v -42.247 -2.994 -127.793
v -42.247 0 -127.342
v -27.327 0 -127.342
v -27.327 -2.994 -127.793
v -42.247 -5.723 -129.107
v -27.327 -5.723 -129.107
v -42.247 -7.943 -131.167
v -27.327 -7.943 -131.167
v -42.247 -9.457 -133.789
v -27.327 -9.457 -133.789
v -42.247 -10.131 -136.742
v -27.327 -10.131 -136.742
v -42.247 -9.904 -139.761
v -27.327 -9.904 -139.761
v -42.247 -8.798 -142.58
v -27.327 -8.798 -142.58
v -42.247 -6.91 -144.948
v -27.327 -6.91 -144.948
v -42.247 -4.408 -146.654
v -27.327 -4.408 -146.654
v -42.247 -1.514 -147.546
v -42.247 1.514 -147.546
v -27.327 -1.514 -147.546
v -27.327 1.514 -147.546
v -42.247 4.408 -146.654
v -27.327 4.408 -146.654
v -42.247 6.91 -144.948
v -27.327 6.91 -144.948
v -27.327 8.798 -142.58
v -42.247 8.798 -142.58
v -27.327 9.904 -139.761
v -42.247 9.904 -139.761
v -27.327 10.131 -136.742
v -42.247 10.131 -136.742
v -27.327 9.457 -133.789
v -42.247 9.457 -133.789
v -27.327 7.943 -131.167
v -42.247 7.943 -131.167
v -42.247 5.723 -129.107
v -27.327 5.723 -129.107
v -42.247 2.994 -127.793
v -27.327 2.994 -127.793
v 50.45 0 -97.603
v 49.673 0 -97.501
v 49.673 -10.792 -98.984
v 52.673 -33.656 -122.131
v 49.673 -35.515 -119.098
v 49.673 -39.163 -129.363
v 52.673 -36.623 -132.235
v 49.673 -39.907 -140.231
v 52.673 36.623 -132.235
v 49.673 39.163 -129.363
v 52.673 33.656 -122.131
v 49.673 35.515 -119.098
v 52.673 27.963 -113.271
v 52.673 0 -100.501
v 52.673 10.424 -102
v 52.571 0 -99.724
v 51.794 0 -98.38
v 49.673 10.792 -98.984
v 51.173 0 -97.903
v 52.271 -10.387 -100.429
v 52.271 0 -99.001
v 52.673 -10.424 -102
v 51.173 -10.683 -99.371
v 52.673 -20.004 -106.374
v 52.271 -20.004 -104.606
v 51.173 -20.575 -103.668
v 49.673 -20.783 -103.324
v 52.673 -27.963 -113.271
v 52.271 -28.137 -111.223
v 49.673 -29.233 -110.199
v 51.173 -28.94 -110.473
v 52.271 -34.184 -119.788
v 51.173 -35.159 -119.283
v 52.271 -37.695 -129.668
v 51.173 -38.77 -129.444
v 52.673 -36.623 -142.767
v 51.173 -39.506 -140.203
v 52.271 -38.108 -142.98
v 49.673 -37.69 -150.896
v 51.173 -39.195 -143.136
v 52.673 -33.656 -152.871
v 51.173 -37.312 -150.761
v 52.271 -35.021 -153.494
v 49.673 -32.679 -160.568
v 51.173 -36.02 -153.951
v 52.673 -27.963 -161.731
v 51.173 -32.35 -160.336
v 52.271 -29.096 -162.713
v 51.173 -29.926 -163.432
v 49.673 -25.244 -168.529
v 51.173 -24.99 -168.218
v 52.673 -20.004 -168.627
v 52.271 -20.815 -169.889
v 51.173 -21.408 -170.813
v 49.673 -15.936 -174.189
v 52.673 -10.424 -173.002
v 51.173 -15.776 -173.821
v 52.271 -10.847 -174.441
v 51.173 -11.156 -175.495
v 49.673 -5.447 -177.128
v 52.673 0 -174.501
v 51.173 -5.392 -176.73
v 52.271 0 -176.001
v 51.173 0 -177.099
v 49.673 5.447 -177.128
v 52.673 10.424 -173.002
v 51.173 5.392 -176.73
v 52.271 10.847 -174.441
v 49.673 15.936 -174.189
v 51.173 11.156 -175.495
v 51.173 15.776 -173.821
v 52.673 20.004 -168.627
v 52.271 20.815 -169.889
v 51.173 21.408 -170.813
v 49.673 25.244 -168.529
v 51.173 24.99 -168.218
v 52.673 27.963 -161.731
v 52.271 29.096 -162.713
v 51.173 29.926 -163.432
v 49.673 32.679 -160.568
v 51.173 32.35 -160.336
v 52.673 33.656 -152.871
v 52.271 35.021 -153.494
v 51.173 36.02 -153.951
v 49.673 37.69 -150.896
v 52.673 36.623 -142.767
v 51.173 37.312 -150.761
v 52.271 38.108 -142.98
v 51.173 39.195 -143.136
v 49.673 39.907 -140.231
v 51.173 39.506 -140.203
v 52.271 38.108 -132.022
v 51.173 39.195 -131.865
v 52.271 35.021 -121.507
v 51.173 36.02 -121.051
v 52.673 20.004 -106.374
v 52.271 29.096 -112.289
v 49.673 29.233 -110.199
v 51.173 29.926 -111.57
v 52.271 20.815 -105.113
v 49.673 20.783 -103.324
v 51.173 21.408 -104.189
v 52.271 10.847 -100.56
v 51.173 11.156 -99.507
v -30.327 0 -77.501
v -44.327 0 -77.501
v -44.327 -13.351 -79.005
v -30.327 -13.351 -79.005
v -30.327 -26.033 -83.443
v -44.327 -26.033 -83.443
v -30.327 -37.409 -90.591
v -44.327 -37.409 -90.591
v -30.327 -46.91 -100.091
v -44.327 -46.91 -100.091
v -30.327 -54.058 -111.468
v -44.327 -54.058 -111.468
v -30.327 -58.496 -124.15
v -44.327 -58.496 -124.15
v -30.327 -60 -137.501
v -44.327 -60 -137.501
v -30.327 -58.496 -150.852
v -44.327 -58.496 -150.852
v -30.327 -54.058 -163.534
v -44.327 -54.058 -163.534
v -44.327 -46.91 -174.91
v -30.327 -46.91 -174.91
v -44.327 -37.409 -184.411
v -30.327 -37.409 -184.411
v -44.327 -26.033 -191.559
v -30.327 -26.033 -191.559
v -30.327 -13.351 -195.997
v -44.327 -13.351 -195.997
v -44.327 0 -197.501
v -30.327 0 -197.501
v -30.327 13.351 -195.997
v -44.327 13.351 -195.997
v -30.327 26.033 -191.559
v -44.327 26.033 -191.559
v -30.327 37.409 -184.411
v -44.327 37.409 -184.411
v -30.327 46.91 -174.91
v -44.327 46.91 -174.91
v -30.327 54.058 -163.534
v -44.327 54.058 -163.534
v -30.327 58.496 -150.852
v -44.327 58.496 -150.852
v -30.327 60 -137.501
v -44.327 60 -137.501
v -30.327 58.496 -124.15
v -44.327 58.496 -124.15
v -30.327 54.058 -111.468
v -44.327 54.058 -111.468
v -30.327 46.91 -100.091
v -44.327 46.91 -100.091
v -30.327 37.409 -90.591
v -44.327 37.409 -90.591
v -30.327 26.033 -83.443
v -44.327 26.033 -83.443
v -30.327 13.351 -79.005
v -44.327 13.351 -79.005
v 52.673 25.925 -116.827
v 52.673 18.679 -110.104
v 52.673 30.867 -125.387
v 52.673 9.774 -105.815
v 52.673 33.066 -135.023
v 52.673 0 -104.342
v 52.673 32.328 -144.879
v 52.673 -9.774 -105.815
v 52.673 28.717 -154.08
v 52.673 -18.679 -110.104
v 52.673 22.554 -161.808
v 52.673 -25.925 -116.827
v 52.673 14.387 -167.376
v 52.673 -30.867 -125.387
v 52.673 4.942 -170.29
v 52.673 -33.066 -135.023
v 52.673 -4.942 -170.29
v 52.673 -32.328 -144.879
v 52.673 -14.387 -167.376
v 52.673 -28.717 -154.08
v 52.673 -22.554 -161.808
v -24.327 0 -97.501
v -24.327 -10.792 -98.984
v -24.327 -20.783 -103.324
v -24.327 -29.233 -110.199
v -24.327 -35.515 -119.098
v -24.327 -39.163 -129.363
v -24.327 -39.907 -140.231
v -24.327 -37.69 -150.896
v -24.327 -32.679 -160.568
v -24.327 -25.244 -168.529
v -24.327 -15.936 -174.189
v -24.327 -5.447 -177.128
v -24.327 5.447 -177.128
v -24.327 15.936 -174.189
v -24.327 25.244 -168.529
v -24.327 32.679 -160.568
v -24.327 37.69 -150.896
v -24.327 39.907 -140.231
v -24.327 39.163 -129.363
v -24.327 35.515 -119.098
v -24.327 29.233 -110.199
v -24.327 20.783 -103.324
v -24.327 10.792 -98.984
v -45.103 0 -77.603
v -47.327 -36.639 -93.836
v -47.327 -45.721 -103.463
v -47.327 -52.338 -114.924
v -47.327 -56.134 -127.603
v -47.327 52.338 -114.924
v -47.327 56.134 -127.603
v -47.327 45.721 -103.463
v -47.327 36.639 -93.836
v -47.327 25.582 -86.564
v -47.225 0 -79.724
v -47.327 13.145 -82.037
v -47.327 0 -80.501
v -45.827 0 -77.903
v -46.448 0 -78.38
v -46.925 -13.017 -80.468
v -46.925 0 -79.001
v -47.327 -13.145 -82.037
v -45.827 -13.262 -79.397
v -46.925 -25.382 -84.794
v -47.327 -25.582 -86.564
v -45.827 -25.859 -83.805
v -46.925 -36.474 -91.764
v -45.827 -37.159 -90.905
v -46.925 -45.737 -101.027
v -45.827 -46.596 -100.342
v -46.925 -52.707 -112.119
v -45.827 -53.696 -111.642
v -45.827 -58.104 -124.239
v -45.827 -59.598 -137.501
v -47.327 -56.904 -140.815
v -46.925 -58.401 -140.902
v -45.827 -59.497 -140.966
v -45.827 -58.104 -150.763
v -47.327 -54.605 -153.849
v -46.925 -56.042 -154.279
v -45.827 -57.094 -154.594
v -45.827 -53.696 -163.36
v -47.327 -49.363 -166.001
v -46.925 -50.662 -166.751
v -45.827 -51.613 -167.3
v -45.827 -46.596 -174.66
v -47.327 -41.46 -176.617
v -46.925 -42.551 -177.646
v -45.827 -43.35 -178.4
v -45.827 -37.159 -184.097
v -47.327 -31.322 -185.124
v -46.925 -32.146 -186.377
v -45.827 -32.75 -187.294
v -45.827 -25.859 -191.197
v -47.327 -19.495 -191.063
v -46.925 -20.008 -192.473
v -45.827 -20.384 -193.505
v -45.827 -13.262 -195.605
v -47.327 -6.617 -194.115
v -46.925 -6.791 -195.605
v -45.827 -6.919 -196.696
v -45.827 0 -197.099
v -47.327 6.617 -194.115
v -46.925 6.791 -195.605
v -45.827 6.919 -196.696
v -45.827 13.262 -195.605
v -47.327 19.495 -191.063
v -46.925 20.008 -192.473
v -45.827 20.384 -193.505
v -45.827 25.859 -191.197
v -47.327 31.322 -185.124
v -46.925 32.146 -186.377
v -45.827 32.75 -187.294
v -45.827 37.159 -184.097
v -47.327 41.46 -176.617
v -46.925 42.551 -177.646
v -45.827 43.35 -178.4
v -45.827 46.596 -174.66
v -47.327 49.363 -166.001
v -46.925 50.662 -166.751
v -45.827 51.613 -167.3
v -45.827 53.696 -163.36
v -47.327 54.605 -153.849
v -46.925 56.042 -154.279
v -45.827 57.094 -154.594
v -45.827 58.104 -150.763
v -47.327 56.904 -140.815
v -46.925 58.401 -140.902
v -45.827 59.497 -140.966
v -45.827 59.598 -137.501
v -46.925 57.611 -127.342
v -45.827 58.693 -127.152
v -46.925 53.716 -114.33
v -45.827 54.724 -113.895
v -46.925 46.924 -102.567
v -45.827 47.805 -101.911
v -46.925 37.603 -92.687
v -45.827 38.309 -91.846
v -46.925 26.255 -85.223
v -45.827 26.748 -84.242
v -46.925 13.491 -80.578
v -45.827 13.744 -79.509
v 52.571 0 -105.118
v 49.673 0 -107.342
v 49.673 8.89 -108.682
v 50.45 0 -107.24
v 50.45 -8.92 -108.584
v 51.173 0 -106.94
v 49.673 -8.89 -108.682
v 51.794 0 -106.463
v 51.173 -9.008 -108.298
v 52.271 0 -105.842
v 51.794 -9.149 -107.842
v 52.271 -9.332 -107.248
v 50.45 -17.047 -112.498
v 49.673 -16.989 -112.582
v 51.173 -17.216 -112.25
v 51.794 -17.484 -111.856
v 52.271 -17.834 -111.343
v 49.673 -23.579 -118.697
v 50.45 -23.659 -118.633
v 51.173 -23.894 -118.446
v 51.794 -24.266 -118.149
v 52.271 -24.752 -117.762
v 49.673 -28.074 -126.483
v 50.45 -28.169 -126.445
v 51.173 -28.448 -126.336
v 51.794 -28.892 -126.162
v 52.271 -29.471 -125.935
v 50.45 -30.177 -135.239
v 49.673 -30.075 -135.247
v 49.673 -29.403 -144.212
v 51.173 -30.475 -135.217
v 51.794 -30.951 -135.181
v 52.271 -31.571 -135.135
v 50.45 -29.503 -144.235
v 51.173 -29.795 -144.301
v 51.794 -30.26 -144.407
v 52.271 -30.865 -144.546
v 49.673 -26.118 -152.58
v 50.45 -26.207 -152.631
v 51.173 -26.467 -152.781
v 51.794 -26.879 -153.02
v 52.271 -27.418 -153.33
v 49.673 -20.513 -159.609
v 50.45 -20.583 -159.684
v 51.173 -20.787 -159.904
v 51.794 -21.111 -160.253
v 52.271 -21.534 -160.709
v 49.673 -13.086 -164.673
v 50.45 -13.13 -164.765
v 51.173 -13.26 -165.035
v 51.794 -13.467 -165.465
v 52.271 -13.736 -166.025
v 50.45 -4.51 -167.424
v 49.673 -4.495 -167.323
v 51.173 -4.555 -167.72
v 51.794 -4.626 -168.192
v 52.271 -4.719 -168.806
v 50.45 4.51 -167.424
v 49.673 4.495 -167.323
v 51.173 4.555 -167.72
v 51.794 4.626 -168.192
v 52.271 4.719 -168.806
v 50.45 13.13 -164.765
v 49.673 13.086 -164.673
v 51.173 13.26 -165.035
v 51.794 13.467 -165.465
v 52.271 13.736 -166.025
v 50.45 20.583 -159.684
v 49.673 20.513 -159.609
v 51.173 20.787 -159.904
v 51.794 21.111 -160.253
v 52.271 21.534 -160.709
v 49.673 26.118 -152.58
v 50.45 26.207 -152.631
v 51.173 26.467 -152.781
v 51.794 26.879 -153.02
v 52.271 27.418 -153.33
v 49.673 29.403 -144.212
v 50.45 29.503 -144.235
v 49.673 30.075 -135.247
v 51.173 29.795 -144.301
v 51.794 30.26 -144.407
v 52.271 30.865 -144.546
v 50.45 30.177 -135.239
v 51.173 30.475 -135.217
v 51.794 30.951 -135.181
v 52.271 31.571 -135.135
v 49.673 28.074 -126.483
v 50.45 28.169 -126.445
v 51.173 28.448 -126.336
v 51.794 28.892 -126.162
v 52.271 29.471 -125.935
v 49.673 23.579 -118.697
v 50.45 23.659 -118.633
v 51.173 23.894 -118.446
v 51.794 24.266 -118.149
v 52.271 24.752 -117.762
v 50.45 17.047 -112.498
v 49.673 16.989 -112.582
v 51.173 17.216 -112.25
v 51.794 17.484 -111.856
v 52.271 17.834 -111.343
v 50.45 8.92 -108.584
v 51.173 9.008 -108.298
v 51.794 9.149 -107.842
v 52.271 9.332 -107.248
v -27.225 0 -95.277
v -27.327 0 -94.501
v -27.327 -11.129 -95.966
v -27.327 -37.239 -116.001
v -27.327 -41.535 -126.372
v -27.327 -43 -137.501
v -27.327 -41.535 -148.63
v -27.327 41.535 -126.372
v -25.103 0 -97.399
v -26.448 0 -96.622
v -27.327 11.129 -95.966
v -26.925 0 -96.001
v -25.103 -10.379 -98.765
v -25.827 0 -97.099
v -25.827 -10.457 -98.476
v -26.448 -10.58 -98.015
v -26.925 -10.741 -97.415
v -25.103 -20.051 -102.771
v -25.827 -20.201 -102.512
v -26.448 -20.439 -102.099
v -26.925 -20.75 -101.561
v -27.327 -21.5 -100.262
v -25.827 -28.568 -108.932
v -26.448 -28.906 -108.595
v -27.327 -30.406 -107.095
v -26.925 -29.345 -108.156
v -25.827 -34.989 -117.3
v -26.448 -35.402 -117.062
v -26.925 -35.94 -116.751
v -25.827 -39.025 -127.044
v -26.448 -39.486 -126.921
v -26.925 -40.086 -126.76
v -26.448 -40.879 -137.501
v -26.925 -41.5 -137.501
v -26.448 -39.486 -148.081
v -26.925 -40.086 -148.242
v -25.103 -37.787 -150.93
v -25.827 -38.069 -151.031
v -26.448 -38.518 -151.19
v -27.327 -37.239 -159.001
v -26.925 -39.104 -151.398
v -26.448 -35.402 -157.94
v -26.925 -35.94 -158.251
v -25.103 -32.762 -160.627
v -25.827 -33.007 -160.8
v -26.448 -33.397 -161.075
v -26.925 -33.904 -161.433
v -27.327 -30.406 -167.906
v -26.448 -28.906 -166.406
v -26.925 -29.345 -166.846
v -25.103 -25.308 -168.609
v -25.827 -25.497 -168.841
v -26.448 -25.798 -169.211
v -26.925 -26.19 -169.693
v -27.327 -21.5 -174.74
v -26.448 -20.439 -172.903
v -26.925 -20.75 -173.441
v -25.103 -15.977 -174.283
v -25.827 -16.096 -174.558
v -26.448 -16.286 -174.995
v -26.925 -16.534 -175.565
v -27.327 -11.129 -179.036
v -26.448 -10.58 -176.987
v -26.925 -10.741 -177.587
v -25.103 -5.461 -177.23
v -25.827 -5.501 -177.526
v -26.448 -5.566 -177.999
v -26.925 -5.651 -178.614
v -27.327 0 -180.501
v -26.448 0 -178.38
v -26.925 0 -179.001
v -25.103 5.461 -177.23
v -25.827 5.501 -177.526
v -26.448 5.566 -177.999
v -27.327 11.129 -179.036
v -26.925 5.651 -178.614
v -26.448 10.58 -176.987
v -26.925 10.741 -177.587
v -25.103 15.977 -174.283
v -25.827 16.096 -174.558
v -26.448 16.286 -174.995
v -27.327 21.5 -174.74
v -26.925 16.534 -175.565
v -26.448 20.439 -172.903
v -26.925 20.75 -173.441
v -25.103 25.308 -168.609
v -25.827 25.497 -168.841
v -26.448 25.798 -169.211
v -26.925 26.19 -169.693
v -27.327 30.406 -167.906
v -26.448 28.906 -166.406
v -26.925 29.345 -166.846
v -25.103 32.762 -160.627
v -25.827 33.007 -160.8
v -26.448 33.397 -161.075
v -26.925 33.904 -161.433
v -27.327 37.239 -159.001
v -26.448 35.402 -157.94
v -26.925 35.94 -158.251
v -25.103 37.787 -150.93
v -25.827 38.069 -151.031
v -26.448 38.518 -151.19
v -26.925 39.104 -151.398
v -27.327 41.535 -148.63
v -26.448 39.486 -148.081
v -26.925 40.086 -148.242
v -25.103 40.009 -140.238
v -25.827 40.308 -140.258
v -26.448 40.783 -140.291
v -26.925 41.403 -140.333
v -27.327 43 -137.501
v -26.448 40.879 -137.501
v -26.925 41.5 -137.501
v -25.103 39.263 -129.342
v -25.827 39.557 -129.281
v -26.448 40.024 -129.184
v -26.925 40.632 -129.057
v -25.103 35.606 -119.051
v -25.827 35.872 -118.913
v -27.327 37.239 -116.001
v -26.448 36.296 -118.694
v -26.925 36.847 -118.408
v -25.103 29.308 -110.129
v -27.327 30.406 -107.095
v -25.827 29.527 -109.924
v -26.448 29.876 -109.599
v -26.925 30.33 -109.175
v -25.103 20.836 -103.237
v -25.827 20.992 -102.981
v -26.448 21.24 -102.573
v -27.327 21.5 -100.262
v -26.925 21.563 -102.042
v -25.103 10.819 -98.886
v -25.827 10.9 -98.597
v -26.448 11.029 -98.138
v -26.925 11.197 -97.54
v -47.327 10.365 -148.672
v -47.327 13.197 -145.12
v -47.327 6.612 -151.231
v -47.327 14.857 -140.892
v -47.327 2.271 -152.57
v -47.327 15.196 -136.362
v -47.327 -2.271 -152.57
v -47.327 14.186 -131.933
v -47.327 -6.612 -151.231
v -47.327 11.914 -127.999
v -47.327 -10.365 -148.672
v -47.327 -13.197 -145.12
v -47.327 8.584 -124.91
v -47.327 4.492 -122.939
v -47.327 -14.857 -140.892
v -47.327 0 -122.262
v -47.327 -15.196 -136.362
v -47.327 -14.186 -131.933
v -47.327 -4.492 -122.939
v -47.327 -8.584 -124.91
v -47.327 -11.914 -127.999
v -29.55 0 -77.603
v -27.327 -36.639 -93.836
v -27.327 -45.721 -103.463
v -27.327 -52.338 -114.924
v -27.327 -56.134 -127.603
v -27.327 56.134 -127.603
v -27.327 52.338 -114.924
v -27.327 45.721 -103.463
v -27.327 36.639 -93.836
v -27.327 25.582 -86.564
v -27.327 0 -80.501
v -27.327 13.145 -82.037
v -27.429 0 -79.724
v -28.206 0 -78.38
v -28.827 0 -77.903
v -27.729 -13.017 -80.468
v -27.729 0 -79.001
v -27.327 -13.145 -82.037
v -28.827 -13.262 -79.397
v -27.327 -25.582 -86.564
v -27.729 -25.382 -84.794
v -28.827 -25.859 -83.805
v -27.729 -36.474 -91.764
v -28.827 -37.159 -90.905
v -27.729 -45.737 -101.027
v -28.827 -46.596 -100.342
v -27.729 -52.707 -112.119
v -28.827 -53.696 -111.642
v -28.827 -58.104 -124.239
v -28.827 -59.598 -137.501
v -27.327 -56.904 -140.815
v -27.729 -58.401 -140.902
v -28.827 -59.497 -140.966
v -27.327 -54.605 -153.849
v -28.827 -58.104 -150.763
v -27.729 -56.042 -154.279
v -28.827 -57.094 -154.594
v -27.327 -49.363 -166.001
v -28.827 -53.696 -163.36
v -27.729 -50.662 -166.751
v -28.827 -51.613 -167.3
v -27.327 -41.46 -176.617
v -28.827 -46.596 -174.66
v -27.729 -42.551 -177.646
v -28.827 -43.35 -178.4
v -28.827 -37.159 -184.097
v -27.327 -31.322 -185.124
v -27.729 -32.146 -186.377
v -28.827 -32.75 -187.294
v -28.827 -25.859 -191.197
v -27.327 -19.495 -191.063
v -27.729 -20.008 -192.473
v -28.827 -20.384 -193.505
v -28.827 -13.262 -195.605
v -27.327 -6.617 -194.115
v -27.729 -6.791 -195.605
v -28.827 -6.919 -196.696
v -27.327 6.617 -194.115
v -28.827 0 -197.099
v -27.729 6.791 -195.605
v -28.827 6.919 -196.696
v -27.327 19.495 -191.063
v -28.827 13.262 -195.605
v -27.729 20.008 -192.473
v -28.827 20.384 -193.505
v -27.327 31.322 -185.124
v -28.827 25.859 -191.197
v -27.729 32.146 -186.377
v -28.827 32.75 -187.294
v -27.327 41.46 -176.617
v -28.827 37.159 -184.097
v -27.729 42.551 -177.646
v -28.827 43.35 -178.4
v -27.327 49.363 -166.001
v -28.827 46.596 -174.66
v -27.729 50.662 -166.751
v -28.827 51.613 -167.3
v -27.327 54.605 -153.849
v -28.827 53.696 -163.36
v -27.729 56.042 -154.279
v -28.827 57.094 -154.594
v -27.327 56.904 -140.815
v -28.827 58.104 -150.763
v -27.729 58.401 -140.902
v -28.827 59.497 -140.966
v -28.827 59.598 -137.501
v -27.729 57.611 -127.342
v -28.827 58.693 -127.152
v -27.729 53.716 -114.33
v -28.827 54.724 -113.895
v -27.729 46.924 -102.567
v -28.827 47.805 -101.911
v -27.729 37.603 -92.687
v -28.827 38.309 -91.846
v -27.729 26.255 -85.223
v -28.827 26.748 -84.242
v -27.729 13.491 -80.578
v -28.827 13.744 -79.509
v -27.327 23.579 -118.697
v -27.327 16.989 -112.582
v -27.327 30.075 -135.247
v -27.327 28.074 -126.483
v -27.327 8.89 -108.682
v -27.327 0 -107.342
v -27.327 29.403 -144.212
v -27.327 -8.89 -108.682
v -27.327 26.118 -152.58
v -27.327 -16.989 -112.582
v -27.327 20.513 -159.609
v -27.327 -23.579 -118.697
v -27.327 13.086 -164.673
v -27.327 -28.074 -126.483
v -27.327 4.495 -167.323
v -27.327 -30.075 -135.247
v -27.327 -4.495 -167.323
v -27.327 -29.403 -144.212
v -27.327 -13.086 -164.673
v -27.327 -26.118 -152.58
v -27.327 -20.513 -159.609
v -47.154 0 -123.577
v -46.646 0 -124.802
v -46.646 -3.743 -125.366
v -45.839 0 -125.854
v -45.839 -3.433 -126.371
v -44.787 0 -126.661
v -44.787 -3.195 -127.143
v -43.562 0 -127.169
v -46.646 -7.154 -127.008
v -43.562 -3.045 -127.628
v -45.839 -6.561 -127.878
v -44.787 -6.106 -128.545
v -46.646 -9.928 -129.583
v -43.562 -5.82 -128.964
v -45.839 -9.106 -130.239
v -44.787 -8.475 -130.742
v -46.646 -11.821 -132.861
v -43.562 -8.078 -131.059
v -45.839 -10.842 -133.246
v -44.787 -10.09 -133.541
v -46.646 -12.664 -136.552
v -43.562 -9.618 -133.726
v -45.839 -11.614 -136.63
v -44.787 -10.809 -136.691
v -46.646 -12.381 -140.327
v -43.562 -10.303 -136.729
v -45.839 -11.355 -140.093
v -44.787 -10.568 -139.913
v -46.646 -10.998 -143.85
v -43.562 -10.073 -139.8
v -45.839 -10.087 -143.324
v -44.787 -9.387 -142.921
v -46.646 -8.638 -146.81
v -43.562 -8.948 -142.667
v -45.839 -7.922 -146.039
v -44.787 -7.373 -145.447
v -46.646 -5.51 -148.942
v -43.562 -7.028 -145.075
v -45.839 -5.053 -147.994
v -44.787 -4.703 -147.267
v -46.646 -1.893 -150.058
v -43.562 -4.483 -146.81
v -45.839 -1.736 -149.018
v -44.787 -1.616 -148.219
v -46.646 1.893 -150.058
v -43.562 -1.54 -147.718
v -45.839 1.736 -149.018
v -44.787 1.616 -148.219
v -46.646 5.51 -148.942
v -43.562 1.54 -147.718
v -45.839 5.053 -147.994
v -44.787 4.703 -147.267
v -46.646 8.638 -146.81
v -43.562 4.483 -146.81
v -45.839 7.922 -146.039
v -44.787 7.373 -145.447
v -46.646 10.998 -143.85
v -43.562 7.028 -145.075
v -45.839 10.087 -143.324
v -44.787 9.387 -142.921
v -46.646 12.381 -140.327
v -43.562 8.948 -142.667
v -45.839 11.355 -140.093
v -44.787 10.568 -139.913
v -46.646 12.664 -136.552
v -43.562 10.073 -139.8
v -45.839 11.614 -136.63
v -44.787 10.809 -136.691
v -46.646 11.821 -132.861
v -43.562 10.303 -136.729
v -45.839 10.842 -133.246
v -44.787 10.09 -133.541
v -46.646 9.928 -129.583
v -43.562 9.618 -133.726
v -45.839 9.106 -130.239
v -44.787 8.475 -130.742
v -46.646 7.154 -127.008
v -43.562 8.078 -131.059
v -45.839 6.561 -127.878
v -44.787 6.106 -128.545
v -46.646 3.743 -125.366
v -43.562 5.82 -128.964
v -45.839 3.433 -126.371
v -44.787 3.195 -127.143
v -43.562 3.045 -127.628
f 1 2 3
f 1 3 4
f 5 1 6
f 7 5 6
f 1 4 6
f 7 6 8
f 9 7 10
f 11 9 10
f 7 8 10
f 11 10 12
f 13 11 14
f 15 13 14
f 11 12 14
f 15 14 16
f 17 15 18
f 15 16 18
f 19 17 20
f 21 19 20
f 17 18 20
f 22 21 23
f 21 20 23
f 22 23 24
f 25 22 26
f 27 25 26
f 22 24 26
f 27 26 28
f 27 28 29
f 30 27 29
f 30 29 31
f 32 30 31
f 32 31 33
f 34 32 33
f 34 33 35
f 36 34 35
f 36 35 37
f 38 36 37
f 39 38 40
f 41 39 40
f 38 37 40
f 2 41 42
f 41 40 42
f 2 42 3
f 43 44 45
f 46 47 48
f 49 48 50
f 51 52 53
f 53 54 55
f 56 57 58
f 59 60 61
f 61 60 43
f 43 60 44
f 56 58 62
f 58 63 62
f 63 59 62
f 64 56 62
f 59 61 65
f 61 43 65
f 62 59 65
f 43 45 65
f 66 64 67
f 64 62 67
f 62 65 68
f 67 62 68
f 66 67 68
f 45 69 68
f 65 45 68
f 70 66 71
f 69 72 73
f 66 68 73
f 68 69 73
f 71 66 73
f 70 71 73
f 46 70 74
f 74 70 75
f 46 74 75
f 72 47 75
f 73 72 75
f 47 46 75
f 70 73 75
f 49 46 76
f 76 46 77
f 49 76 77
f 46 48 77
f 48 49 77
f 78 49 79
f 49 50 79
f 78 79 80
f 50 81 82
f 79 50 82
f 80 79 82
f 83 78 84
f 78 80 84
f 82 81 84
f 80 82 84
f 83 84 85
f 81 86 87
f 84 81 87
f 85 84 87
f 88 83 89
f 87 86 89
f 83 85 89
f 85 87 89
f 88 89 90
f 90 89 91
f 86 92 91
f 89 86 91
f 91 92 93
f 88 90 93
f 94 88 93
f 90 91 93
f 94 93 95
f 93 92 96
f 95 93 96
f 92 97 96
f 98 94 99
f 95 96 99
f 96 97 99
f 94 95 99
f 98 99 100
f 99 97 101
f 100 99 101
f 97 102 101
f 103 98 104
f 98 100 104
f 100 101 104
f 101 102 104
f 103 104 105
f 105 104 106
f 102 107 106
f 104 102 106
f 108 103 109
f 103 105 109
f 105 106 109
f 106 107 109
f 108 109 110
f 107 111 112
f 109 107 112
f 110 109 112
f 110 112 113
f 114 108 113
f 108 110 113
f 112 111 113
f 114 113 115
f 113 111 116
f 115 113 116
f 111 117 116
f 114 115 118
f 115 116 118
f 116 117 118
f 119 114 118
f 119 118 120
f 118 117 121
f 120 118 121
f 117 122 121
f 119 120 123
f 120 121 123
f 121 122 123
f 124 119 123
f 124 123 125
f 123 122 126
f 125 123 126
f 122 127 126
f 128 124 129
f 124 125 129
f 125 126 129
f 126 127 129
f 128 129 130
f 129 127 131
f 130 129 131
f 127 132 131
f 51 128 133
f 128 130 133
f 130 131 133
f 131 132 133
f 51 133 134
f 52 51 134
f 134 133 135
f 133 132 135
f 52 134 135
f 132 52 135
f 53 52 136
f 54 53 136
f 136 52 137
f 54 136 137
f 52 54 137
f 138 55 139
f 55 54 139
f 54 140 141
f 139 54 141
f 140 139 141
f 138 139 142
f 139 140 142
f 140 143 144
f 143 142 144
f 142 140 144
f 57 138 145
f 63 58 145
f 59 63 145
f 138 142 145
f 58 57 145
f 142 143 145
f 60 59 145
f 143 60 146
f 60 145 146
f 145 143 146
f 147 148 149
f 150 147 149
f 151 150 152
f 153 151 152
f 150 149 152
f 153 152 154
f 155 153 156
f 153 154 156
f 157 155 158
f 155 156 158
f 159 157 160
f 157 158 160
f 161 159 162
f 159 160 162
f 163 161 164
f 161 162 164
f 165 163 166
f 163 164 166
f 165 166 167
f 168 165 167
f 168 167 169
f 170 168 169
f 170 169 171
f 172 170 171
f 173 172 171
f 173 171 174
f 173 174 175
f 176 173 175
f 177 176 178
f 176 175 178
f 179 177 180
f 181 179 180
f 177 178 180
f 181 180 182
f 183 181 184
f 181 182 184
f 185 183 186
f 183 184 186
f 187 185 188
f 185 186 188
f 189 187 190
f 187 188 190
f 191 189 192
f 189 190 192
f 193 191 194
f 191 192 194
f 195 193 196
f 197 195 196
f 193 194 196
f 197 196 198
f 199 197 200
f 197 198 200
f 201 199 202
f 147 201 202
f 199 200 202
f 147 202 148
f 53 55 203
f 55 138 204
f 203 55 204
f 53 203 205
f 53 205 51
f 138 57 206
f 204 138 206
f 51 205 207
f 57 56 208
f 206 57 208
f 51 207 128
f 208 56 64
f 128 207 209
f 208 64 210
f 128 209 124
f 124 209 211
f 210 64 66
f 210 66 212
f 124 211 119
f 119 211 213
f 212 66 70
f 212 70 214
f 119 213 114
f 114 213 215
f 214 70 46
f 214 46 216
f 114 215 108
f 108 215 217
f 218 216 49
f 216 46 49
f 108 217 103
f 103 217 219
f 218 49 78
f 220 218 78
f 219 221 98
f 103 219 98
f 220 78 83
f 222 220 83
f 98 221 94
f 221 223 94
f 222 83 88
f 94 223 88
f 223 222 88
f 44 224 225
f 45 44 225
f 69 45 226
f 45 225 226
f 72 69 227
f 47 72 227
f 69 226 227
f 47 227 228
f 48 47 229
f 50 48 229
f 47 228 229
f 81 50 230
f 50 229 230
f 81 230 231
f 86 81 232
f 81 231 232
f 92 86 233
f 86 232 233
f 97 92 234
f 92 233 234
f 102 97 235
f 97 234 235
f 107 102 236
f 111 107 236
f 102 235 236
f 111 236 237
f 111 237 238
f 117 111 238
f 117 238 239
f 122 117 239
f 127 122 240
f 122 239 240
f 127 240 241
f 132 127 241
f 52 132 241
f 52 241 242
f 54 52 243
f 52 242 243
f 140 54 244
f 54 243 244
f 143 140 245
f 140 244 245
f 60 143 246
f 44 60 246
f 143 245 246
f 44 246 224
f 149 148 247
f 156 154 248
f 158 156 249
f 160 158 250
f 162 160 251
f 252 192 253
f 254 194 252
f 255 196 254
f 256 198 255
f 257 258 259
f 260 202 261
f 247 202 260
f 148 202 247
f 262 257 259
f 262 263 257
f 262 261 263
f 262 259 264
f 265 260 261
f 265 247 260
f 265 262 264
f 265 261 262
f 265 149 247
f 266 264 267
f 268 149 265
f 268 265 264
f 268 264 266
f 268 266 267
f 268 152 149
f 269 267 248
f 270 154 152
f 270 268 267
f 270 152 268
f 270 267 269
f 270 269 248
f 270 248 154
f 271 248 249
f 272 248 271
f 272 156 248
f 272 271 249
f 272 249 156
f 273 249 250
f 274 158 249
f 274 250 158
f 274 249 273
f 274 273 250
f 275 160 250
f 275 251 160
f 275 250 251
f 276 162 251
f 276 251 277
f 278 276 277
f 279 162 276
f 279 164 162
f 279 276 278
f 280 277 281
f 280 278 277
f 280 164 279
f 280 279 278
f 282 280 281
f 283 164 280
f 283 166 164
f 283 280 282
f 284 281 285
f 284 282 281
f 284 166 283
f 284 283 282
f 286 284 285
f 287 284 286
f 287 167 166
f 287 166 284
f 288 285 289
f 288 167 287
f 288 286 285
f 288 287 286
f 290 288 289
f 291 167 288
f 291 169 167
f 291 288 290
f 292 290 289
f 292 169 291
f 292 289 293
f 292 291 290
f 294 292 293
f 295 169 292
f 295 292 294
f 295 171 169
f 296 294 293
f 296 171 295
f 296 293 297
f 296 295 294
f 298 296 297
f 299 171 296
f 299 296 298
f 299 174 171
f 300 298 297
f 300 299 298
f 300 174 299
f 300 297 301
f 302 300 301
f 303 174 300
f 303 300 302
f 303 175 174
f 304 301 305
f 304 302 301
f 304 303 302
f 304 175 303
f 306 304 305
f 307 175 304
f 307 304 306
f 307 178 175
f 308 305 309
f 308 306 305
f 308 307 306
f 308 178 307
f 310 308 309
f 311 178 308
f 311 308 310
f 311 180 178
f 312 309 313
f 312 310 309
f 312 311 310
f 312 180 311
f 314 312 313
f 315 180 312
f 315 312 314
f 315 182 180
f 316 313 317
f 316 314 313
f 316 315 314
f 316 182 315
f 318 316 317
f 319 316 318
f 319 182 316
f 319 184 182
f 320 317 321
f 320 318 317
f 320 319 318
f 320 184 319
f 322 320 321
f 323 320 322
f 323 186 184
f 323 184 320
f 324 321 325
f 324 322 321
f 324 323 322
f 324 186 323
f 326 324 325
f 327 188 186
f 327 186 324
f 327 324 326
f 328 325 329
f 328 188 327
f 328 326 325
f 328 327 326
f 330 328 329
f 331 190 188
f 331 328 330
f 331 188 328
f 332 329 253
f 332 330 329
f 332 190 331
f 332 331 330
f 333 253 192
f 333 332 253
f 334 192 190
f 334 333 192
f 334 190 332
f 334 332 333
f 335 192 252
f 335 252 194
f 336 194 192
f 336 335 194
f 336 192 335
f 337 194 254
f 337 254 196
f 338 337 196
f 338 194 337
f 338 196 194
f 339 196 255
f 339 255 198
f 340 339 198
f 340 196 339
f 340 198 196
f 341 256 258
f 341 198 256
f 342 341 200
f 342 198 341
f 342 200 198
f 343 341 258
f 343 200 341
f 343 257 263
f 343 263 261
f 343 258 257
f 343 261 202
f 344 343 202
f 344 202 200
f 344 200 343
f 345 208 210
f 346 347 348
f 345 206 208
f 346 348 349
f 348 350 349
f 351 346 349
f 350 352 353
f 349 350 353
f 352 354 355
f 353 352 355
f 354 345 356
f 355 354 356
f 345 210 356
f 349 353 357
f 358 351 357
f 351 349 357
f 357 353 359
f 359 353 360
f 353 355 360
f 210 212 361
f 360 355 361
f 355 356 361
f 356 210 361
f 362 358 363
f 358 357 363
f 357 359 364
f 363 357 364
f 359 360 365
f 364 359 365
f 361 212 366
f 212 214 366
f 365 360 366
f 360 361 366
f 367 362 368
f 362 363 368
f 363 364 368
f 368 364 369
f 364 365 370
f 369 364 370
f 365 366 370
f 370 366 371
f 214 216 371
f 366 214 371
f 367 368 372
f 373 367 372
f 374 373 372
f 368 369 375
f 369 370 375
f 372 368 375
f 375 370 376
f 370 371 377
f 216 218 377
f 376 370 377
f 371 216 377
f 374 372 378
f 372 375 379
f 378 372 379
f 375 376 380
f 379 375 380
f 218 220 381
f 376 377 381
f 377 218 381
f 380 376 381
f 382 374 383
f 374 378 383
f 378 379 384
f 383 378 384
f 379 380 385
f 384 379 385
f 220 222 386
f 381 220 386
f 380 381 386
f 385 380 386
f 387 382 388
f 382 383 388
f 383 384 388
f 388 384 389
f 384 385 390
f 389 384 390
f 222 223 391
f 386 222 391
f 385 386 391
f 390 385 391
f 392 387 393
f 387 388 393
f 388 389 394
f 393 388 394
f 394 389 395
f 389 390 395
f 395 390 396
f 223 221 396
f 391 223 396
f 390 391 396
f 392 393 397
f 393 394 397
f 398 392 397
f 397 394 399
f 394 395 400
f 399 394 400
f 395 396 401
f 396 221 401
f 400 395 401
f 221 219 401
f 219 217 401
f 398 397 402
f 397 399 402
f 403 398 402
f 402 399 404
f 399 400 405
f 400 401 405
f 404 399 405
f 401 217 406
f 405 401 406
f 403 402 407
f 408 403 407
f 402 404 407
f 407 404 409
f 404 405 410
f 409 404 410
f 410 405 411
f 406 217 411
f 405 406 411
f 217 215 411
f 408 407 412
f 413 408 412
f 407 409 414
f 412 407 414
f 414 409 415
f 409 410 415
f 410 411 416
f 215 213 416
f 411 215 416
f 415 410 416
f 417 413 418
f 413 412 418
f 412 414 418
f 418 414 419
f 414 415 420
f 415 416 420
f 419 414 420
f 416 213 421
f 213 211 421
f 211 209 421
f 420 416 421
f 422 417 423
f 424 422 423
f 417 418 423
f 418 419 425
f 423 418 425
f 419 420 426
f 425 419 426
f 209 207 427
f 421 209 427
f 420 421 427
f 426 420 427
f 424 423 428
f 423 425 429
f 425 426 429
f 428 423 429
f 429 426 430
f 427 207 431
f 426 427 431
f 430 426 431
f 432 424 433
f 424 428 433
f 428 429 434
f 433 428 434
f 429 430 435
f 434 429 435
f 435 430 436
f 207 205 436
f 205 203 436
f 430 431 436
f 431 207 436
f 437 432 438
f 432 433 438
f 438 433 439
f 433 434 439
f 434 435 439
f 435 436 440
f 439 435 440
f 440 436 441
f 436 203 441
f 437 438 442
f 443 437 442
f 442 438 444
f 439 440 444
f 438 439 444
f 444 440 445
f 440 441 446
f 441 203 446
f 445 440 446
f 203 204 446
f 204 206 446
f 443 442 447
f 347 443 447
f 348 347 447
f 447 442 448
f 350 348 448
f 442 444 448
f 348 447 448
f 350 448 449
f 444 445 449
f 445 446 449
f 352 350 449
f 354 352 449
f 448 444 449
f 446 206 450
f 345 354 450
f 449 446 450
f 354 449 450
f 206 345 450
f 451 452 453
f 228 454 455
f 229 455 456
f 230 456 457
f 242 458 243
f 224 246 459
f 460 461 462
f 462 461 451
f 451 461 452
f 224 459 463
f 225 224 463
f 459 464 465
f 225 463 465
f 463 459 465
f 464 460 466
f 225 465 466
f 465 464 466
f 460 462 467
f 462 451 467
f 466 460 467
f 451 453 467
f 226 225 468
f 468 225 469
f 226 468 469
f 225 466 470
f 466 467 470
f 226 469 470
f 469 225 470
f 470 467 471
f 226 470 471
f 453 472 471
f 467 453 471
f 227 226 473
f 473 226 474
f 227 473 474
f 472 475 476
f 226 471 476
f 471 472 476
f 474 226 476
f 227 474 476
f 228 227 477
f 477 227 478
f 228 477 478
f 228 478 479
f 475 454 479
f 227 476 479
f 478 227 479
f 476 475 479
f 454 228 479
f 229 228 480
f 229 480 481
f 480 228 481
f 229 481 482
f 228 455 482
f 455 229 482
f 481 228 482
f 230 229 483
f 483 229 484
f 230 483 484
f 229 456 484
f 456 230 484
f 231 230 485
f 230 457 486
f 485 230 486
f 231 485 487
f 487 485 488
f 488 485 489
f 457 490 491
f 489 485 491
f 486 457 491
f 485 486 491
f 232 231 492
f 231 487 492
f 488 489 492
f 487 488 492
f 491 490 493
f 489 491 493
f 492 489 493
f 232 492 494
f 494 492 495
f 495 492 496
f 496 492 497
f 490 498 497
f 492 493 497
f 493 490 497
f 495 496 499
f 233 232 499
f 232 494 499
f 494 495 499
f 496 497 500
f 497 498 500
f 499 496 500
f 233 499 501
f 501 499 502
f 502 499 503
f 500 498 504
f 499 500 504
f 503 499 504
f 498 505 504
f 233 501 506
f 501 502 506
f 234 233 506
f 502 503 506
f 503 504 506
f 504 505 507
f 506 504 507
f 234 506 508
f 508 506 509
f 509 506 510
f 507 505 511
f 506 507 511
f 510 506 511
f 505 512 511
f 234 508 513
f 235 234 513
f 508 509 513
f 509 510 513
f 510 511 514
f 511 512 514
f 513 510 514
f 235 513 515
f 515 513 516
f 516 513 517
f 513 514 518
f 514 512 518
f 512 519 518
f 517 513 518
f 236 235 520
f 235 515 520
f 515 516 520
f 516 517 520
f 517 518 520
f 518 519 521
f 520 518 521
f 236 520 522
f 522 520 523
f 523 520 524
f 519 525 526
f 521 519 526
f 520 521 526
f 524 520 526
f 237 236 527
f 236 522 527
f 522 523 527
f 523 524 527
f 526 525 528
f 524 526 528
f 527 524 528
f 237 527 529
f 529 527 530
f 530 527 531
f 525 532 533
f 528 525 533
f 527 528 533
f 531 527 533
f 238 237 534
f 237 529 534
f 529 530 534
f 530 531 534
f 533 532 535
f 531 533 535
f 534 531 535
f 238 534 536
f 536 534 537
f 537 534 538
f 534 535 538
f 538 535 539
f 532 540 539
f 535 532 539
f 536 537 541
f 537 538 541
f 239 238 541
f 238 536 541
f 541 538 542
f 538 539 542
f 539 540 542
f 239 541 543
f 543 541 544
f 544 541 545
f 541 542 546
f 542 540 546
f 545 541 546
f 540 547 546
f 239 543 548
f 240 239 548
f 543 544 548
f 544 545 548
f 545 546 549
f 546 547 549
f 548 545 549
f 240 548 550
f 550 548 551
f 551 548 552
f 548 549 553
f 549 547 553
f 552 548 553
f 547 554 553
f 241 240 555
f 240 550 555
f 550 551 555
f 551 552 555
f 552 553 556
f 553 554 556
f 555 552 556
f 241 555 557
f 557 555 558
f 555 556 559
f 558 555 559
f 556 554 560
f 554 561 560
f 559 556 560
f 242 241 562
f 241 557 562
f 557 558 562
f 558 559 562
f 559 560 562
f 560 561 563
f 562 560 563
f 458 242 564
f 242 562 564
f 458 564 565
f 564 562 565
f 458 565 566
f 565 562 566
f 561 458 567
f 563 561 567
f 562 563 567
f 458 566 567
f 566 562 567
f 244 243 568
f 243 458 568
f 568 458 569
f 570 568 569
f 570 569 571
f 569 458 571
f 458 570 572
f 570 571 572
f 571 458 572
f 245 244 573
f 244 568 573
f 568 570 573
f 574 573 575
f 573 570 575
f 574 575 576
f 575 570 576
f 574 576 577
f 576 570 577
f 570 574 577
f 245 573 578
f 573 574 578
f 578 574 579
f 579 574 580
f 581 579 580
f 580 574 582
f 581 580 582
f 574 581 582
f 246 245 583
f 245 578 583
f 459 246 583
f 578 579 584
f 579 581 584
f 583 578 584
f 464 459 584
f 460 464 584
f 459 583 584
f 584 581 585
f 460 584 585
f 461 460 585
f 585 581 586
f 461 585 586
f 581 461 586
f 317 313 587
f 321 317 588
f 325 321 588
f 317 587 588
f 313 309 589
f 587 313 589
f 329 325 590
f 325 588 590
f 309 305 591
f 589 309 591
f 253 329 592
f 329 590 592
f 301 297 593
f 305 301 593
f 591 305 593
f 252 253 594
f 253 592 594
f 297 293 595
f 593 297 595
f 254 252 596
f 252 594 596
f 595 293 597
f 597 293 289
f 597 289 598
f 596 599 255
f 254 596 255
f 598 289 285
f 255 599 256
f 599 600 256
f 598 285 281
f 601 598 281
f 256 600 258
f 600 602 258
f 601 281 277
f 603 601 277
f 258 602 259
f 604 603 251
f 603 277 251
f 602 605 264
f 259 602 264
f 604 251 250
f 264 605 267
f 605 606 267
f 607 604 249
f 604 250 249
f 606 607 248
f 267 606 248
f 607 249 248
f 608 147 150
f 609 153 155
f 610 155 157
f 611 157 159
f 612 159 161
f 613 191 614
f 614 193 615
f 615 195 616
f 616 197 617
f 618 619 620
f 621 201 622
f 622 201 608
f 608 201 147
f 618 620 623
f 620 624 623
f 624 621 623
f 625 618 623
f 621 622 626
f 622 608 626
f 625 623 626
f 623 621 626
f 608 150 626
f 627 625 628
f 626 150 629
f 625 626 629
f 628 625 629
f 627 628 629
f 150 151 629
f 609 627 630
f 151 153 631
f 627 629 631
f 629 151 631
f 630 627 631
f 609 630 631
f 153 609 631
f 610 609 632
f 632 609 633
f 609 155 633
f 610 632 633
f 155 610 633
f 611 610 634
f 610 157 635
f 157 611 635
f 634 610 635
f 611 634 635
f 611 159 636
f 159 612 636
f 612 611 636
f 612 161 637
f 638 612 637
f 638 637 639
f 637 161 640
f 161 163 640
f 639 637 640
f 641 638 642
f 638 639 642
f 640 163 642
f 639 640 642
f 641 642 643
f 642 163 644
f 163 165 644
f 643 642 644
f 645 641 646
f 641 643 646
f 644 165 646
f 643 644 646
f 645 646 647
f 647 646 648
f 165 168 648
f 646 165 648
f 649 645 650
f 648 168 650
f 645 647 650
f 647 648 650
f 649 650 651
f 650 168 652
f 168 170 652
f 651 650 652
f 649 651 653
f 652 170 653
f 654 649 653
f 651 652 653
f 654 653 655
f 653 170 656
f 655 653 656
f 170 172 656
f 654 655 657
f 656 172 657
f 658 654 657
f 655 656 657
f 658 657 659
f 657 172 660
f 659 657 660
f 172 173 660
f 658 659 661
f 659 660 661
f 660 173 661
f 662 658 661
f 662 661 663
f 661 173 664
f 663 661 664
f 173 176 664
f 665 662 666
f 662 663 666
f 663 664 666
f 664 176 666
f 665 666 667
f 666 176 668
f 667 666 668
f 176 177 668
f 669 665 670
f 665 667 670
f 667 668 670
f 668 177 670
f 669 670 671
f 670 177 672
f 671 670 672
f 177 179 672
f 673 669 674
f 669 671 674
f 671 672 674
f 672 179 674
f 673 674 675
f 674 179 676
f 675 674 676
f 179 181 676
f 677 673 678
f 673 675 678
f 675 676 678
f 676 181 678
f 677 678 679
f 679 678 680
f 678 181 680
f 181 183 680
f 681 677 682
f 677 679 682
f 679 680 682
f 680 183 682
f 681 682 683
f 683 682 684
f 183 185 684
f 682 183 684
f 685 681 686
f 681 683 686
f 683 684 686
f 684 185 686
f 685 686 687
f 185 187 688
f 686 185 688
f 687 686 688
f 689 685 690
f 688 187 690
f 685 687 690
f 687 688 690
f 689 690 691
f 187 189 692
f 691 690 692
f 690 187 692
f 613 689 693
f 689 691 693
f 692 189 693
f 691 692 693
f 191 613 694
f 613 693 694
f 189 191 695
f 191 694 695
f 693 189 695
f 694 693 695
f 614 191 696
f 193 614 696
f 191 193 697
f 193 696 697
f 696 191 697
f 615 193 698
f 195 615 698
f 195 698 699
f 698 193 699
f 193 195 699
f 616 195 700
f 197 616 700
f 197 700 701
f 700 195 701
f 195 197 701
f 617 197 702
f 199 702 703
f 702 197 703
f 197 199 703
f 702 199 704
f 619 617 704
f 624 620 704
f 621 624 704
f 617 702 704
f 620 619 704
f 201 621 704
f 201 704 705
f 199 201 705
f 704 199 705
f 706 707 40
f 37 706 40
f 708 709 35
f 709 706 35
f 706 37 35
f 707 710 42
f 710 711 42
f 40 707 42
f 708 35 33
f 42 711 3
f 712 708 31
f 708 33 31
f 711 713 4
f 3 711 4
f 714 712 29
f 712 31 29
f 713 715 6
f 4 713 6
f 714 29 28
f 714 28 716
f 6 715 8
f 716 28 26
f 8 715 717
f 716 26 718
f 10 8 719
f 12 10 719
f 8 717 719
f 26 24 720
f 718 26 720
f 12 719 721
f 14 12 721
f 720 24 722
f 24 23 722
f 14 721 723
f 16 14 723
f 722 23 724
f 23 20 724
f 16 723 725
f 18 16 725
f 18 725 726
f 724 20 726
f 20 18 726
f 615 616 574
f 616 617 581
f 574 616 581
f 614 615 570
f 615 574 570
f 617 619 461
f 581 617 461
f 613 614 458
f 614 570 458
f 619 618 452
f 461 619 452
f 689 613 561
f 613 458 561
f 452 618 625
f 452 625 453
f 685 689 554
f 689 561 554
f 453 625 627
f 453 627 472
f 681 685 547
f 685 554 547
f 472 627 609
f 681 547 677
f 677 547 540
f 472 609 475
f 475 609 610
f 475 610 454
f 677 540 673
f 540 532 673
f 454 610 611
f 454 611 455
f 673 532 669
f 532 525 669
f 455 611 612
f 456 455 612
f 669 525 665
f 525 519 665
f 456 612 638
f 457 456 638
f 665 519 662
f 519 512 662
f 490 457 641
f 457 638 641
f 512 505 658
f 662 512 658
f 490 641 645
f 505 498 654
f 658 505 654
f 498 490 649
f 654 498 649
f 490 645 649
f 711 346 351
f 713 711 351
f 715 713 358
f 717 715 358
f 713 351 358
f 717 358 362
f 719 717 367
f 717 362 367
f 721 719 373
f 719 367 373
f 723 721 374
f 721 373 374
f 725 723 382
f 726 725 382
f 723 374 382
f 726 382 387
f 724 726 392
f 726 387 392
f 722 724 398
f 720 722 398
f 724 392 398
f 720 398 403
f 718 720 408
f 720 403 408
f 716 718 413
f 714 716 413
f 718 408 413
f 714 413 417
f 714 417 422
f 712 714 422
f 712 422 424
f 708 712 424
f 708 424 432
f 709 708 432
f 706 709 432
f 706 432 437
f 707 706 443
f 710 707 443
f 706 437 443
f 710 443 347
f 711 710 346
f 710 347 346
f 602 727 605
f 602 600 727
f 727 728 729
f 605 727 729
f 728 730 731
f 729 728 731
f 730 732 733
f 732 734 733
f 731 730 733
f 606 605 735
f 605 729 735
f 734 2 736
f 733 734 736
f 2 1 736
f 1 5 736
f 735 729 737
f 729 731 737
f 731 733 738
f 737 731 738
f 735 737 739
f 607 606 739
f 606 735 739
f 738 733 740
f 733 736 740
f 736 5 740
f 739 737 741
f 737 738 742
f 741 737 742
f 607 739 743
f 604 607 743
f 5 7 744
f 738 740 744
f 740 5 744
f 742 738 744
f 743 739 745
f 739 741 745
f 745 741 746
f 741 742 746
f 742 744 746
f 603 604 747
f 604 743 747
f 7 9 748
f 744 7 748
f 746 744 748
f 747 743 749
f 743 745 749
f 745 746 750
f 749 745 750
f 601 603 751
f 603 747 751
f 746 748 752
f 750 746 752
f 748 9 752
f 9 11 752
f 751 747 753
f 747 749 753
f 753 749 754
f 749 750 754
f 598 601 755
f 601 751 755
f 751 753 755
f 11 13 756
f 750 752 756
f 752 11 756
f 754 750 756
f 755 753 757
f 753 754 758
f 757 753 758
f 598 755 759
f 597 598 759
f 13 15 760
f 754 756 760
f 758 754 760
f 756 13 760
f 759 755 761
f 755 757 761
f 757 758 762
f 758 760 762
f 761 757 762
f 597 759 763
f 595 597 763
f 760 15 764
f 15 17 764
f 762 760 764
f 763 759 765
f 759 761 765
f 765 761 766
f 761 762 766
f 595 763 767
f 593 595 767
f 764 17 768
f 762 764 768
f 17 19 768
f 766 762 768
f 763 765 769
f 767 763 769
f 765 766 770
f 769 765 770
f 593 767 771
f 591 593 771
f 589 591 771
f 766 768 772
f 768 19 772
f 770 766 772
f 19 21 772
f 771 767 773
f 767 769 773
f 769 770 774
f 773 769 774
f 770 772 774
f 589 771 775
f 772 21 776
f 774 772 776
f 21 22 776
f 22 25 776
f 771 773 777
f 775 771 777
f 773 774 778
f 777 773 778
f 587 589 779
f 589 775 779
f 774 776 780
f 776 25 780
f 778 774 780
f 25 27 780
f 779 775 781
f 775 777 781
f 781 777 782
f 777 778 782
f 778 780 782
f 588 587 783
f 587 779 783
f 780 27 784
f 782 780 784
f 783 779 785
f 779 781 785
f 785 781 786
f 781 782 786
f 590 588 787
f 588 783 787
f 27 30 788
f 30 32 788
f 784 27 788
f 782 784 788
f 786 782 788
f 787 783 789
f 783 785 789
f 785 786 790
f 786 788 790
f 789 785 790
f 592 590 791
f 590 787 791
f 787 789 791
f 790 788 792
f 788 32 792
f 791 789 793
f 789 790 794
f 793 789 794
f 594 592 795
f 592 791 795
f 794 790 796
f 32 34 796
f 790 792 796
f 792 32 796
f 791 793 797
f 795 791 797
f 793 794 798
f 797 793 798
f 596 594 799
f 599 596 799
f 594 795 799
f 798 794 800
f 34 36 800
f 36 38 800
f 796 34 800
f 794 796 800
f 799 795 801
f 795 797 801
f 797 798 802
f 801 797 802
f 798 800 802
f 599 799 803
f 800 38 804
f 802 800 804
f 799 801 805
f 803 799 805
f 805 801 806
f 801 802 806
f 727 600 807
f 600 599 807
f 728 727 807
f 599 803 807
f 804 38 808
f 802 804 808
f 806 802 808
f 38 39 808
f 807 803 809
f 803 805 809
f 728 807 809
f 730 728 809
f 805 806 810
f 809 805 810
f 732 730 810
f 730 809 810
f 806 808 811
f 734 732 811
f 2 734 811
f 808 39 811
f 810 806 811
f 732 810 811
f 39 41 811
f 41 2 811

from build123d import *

# Parameters (mm, degrees)
F5_R = 3
F6_R = 5.08


# Not quite as in the source:
# - a feature of the source that left no trace in its solid (it failed there, or was rolled back) is left out
# - the program builds the solid bodies; features that only make, move or delete a surface that nothing else refers to are left out


with BuildPart() as f4:
    # F3 (on Front) → F4 (revolve)
    with BuildSketch(Plane.XZ):
        Polygon((-47.3268434405, -77.5008672476), (-47.3268434405, -127.3418408632), (-27.3268434405, -127.3418408632), (-27.3268434405, -107.3418408632), (52.6731565595, -107.3418408632), (52.6731565595, -97.5008672476), (-27.3268434405, -97.5008672476), (-27.3268434405, -77.5008672476), align=None)
    revolve(axis=Axis((2.6731565595, 0, -137.5008672476), (1, 0, 0)))

    # F5
    f5_edges = [f4.edges().sort_by_distance(p)[0] for p in [
        (52.673157, 0, -167.659894),
        (52.673157, 0, -177.500867),
        (-27.326843, 0, -177.500867),
        (-27.326843, 0, -197.500867),
        (-47.326843, 0, -197.500867),
    ]]
    fillet(f5_edges, radius=F5_R)

    # F6
    f6_edges = [f4.edges().sort_by_distance(p)[0] for p in [
        (-47.326843, 0, -147.659894),
    ]]
    fillet(f6_edges, radius=F6_R)


solid = f4.part
